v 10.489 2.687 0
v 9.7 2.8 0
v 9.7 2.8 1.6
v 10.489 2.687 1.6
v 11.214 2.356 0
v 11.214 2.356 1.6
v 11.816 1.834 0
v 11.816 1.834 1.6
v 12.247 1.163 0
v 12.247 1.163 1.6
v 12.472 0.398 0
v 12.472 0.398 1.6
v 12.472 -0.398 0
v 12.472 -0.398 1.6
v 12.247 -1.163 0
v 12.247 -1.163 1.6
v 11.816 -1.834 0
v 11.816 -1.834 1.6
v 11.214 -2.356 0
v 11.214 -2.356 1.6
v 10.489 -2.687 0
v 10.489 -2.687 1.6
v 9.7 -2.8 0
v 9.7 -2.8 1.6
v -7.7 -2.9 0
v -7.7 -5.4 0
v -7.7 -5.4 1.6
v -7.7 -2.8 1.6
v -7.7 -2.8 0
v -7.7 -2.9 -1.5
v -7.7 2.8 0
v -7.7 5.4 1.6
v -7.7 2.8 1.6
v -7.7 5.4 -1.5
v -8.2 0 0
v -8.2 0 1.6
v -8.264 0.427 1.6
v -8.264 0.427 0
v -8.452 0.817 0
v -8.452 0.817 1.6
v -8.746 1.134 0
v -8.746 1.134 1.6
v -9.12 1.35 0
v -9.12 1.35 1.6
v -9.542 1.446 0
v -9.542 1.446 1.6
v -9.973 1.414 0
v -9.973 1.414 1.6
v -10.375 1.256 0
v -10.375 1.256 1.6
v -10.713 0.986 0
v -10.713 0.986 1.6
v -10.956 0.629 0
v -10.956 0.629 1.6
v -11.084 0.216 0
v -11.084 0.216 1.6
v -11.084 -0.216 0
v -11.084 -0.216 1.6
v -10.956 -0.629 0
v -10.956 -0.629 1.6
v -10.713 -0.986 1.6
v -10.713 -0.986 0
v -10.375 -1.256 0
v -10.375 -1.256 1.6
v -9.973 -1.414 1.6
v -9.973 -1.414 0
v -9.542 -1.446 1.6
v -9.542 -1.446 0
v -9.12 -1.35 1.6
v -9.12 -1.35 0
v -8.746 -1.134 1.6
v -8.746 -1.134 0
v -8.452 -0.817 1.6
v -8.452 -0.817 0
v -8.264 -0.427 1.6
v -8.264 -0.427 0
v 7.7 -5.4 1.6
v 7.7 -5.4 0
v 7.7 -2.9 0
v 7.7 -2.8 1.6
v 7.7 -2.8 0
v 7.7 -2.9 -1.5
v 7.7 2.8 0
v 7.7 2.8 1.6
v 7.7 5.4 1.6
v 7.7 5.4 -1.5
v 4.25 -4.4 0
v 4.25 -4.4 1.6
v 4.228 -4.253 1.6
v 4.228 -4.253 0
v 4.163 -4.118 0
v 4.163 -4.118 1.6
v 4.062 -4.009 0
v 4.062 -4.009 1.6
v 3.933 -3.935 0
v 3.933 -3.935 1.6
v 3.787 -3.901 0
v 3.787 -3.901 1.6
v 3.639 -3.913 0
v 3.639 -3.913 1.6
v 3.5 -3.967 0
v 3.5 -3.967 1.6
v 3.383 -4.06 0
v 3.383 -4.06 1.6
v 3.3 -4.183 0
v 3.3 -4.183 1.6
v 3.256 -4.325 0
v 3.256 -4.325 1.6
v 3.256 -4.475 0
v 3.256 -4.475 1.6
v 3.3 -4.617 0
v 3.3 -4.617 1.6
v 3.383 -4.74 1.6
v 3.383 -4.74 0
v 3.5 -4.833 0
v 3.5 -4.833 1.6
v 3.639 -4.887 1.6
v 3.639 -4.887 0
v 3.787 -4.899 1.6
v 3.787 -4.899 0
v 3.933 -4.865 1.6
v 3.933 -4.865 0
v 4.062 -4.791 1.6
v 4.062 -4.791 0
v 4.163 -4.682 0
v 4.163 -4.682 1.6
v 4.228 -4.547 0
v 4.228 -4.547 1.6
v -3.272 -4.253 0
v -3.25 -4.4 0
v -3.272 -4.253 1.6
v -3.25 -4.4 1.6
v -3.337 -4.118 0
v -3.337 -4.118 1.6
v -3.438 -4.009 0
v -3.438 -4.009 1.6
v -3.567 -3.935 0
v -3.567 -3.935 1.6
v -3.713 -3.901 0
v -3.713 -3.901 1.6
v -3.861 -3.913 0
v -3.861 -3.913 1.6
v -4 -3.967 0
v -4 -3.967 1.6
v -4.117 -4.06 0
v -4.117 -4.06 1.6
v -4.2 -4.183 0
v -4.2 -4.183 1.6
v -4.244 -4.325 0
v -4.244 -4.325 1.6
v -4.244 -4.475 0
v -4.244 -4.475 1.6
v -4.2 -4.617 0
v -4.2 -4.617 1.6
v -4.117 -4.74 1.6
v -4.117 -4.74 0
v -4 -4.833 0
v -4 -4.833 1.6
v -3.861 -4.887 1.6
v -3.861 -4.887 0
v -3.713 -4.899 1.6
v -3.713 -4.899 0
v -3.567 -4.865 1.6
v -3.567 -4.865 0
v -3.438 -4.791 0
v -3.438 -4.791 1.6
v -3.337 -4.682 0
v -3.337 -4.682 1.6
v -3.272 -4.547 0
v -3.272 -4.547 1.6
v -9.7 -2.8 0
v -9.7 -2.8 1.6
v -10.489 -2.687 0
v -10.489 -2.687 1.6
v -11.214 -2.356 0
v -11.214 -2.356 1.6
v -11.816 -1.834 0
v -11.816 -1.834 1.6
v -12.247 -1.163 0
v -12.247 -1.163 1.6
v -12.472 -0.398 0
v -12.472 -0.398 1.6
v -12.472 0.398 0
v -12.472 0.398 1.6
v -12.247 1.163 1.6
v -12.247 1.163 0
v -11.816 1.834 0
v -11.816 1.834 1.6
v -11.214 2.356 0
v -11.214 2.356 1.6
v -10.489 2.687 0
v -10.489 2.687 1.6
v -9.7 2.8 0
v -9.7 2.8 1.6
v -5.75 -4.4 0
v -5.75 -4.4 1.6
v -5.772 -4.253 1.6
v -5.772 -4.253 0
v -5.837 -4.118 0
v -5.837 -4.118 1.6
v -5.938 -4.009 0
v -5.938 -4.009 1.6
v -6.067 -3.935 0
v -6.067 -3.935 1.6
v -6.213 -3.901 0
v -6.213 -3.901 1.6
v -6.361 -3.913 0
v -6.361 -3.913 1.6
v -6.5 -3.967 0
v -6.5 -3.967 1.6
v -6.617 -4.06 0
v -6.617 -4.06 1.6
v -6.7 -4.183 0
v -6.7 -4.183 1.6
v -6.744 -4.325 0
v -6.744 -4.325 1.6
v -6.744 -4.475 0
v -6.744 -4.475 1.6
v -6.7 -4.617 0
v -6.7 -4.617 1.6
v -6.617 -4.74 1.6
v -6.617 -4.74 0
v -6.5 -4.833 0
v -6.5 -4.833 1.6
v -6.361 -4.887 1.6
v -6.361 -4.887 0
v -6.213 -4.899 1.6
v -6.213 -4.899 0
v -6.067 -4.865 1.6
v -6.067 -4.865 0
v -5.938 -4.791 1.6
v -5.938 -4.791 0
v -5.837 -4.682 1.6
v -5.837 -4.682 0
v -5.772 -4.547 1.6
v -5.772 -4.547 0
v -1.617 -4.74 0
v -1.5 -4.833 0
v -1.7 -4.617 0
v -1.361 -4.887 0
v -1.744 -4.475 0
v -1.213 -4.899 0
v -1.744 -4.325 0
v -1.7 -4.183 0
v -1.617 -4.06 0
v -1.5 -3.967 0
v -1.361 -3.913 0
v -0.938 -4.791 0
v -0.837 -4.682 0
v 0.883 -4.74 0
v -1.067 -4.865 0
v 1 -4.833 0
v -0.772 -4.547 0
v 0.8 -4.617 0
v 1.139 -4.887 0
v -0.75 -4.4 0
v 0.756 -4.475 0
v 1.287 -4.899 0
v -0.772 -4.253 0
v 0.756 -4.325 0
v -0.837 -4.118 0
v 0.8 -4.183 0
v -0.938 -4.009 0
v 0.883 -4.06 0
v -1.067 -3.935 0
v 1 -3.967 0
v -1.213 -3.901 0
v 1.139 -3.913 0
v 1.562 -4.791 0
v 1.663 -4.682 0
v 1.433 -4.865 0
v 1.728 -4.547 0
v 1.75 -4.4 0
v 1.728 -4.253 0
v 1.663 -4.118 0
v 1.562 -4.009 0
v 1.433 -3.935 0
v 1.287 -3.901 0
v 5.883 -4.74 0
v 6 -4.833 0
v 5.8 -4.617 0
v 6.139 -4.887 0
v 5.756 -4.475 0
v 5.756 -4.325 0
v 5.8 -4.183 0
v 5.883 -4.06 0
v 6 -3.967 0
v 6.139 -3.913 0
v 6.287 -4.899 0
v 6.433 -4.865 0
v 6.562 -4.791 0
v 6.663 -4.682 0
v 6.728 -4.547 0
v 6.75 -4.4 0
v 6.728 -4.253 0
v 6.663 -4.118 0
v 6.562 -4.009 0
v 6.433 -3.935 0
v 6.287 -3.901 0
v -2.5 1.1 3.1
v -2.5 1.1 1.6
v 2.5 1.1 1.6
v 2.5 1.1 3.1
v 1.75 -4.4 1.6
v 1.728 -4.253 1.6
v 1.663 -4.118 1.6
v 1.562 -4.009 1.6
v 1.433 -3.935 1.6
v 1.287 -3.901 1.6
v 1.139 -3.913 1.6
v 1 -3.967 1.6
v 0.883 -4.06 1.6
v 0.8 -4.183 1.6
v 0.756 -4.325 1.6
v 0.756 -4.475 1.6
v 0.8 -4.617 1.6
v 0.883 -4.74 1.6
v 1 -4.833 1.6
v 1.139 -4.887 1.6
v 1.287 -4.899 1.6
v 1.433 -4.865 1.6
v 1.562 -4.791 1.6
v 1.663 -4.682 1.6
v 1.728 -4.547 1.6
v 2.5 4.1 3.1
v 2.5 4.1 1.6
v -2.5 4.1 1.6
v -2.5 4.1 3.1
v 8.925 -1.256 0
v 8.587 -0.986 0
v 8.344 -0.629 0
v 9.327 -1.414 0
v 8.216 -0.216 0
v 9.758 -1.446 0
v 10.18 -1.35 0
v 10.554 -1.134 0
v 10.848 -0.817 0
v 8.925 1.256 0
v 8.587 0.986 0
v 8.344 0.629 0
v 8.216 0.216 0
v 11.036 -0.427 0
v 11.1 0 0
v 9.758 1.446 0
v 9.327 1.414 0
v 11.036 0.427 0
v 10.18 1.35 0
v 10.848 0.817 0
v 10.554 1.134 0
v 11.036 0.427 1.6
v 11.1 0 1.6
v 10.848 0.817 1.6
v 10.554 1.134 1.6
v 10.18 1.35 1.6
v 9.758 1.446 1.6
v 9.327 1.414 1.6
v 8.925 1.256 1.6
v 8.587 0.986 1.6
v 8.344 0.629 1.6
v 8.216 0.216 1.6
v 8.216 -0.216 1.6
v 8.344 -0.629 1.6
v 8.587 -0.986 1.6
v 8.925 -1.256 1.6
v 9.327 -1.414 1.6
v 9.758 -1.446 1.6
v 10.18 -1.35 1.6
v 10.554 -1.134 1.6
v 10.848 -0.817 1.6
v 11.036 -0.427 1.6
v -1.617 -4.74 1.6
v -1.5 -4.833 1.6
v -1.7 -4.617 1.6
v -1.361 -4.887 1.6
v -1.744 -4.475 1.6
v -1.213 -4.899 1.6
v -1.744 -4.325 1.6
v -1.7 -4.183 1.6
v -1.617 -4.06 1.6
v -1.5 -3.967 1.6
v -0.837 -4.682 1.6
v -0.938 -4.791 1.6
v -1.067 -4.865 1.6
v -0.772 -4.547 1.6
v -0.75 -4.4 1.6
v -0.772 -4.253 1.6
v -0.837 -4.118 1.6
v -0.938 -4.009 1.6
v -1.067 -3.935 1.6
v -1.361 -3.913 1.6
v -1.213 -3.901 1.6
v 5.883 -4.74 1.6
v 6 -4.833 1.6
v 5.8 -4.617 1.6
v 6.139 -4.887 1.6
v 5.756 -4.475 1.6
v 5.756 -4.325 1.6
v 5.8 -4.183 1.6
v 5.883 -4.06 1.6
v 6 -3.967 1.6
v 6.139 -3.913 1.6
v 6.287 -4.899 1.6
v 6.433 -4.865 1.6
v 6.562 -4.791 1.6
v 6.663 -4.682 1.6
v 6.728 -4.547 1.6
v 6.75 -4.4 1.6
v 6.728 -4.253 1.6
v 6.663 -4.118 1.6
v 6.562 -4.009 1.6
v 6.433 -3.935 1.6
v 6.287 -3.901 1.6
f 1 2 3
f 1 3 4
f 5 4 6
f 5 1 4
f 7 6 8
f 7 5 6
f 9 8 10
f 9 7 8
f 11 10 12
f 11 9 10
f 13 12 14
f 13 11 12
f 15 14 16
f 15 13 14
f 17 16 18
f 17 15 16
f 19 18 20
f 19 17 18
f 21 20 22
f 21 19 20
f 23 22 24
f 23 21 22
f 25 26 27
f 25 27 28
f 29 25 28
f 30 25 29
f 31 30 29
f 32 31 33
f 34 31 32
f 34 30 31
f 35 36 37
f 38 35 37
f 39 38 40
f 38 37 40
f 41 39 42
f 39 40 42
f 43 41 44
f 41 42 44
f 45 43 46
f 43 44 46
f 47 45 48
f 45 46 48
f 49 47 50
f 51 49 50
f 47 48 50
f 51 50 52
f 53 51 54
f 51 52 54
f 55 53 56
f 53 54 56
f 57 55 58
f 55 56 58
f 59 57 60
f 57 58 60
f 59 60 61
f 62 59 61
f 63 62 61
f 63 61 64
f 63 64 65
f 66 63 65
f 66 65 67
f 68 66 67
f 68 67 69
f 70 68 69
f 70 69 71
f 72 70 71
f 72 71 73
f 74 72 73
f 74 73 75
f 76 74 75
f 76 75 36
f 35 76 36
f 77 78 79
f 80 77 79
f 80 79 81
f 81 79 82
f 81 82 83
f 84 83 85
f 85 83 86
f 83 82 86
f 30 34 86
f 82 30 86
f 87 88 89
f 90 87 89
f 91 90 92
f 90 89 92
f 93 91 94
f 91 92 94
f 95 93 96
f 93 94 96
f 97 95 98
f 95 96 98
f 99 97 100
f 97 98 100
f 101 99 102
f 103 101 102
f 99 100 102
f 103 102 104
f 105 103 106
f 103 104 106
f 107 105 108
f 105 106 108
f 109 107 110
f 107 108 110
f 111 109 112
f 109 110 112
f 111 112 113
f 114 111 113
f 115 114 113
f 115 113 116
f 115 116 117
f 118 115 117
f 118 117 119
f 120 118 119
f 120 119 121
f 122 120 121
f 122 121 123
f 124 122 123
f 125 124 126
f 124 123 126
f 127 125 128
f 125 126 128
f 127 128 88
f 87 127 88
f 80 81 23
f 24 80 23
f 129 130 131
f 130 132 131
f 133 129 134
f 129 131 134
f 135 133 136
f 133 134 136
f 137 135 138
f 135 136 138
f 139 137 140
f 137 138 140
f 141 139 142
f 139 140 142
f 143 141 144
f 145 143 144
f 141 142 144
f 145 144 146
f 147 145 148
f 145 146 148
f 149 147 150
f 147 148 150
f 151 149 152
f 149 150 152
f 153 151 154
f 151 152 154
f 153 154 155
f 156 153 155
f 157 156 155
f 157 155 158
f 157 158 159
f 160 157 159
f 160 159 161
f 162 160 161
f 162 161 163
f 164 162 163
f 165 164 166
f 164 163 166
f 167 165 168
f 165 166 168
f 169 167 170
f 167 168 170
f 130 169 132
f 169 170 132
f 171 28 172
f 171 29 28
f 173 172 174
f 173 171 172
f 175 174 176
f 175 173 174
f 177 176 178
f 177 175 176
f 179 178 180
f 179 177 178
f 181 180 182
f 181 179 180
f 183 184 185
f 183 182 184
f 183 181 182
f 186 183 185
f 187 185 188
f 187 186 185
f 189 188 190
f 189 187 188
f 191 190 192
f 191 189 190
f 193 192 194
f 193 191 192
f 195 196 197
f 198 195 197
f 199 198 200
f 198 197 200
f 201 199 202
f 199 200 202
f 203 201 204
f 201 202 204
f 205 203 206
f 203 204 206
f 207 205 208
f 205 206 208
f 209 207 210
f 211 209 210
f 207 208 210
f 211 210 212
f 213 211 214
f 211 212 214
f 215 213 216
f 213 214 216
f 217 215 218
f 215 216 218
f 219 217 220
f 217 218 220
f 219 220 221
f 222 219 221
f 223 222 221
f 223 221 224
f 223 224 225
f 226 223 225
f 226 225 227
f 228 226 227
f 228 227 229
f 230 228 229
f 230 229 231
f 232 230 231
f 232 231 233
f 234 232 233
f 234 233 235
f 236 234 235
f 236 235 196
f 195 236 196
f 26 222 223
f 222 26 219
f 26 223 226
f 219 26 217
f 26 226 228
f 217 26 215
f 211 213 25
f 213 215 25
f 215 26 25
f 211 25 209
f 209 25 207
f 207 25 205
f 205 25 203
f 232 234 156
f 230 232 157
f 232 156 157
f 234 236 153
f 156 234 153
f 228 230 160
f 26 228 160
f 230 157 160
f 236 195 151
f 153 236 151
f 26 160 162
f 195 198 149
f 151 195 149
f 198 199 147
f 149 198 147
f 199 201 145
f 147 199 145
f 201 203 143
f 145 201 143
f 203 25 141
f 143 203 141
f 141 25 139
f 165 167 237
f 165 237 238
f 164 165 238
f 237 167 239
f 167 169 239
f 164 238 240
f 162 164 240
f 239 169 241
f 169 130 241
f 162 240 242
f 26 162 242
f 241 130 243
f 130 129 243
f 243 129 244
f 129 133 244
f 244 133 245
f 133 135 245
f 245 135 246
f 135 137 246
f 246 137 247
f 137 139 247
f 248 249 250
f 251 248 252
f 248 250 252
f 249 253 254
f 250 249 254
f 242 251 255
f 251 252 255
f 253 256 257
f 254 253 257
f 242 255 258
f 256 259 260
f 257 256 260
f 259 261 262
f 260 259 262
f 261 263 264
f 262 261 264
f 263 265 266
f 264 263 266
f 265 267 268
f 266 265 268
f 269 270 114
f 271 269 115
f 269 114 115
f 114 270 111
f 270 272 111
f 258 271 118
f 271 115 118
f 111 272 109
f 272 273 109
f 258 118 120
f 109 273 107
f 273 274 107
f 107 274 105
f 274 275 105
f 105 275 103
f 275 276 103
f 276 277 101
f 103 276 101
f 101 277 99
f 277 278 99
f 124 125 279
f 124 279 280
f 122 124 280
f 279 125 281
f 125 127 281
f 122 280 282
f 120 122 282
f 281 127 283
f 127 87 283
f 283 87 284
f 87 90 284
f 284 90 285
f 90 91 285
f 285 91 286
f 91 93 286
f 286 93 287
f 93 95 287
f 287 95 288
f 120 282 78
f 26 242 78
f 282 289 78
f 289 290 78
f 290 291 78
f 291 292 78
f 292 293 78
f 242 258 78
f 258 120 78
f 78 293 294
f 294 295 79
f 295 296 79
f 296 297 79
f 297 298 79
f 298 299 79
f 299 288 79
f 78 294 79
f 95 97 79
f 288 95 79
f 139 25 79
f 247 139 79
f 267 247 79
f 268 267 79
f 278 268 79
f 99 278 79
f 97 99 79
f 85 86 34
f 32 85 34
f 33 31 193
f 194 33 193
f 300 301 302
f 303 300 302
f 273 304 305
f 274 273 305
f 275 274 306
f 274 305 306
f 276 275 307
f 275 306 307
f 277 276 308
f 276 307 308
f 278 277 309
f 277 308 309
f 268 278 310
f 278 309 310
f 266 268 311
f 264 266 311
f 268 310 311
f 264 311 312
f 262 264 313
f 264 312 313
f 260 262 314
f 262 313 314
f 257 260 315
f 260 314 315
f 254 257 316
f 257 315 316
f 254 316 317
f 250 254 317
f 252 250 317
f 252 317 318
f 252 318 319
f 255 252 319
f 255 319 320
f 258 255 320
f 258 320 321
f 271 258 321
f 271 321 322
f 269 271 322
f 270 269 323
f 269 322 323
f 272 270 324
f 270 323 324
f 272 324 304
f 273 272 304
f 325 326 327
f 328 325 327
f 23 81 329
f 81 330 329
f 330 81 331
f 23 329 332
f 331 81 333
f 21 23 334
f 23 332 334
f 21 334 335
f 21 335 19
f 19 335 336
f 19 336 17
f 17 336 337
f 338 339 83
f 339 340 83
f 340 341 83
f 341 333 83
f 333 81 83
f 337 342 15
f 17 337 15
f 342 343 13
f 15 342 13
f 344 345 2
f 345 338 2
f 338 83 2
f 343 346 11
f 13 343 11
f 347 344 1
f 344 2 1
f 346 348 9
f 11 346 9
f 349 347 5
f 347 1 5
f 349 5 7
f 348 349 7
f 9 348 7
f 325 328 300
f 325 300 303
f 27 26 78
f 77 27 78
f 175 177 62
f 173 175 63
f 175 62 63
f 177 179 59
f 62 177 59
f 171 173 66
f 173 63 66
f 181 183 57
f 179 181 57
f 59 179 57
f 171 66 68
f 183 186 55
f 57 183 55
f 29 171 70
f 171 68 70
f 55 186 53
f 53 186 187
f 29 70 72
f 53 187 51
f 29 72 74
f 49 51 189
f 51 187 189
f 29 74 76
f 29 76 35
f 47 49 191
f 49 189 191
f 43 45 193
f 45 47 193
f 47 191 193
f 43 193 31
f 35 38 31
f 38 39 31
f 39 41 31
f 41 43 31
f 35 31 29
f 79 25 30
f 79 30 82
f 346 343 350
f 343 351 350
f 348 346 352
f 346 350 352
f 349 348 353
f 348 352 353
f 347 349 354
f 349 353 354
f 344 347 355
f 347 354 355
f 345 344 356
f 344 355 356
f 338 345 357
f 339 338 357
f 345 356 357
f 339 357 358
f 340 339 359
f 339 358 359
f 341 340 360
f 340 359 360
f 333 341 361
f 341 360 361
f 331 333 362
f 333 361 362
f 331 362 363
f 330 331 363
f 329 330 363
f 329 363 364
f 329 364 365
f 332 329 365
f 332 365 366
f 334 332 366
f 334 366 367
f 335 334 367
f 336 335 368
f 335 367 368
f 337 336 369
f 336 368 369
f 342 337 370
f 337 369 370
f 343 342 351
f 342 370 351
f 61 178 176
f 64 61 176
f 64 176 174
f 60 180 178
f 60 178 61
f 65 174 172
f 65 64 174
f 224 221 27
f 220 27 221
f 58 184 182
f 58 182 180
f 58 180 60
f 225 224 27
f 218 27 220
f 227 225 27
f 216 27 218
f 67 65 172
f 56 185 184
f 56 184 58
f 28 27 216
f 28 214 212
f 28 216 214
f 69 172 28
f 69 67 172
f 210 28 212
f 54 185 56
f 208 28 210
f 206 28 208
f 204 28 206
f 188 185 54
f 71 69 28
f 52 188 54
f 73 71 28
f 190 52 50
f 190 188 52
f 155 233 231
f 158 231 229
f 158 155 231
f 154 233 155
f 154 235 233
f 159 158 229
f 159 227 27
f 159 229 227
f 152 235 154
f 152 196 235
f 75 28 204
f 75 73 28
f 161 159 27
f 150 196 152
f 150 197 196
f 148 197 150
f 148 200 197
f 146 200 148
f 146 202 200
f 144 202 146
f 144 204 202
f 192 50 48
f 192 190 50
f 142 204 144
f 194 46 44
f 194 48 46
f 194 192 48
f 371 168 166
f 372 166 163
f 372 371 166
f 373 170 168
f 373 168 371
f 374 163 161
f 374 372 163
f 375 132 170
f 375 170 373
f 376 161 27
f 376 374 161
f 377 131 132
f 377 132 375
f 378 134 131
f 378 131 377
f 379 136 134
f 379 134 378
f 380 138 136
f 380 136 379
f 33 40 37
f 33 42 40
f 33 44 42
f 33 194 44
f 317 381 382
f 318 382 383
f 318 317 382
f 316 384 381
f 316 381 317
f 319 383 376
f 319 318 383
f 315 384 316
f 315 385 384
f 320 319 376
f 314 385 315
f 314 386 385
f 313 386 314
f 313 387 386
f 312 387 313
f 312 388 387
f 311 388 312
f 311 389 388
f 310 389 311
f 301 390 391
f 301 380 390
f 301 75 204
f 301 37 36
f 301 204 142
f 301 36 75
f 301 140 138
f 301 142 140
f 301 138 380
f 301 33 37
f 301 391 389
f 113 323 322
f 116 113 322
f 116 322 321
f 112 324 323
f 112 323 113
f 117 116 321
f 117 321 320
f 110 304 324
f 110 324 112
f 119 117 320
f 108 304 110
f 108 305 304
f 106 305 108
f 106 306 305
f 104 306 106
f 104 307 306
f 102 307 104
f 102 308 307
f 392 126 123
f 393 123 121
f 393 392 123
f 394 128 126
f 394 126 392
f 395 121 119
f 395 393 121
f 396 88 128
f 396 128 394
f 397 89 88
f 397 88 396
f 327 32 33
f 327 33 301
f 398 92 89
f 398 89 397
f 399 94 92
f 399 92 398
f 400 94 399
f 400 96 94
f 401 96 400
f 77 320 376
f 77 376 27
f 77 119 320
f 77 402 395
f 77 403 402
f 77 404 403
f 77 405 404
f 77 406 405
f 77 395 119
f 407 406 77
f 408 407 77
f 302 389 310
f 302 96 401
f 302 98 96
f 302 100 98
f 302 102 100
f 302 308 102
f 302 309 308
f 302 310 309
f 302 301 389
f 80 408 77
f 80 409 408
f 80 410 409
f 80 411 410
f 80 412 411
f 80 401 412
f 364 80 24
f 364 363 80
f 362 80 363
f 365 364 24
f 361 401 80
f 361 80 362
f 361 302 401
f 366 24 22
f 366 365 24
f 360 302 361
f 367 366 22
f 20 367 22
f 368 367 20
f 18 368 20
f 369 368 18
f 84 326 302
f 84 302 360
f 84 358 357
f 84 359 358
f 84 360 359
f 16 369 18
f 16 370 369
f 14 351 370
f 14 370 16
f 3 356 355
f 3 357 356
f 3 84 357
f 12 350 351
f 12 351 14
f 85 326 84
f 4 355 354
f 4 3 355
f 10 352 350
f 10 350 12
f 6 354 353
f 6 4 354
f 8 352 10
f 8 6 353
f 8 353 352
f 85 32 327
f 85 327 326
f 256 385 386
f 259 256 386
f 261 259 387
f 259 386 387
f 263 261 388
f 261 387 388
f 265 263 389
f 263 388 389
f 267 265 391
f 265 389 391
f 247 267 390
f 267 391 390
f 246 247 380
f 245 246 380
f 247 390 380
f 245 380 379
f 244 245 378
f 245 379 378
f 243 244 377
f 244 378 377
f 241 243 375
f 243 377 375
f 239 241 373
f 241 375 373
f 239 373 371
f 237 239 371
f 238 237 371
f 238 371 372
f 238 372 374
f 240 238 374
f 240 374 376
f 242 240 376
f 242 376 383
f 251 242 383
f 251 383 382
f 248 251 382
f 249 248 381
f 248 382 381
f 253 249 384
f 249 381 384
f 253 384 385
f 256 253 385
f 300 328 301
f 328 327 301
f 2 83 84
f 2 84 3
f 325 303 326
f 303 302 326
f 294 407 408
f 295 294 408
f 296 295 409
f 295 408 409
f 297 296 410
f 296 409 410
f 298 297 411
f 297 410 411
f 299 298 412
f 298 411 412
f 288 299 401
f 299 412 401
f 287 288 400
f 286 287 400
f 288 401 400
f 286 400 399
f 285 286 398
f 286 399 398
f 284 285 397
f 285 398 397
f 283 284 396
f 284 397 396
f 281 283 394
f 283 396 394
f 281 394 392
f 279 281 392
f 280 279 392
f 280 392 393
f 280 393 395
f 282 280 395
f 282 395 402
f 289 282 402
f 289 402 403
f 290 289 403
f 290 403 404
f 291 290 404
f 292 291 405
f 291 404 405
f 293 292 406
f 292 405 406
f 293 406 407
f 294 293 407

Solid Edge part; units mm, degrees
sketch "Sketch1" plane through (0, 0, 0) normal (0, 0, 1) x (1, 0, 0)
  line L0 (-7.7, -5.4) -> (7.7, -5.4)
  line L1 (7.7, -5.4) -> (7.7, -2.8)
  line L2 (7.7, -2.8) -> (9.7, -2.8)
  arc A0 (9.7, 2.8) -> (9.7, -2.8) centre (9.7, 0) cw
  line L3 (7.7, 2.8) -> (9.7, 2.8)
  line L4 (7.7, 5.4) -> (7.7, 2.8)
  line L5 (7.7, 5.4) -> (-7.7, 5.4)
  line L6 (-7.7, 5.4) -> (-7.7, 2.8)
  line L7 (-7.7, 2.8) -> (-9.7, 2.8)
  arc A1 (-9.7, 2.8) -> (-9.7, -2.8) centre (-9.7, 0) ccw
  line L8 (-7.7, -2.8) -> (-9.7, -2.8)
  line L9 (-7.7, -5.4) -> (-7.7, -2.8)
  dimension "D1" = 5.6
  dimension "D2" = 25
  dimension "D3" = 15.4
  dimension "D4" = 10.8
extrude "Protrusion1" add sketch "Sketch1" along normal blind 1.6
sketch "Sketch2" plane through (0, 0, 1.6) normal (0, 0, 1) x (1, 0, 0)
  circle A0 centre (9.65, 0) radius 1.45
  circle A1 centre (-9.65, 0) radius 1.45
  dimension "D1" = 1.4
  dimension "D2" = 2.9
  dimension "D3" = 2.9
  dimension "D4" = 1.4
extrude "Cutout1" cut sketch "Sketch2" against normal through all
sketch "Sketch3" plane through (0, 0, 1.6) normal (0, 0, 1) x (1, 0, 0)
  circle A0 centre (-6.25, -4.4) radius 0.5
  circle A1 centre (-3.75, -4.4) radius 0.5
  circle A2 centre (-1.25, -4.4) radius 0.5
  circle A3 centre (1.25, -4.4) radius 0.5
  circle A4 centre (3.75, -4.4) radius 0.5
  circle A5 centre (6.25, -4.4) radius 0.5
  dimension "D1" = 1
  dimension "D2" = 0.5
  dimension "D3" = 2.5
extrude "Cutout2" cut sketch "Sketch3" against normal through all
sketch "Sketch4" plane through (0, 0, 1.6) normal (0, 0, 1) x (1, 0, 0)
  line L0 (-2.5, 1.1) -> (2.5, 1.1)
  line L1 (2.5, 1.1) -> (2.5, 4.1)
  line L2 (2.5, 4.1) -> (-2.5, 4.1)
  line L3 (-2.5, 4.1) -> (-2.5, 1.1)
  dimension "D1" = 5
  dimension "D2" = 3
  dimension "D3" = 4.3
extrude "Extrusionsausprägung_2" add sketch "Sketch4" along normal blind 1.5
sketch "Sketch5" plane through (0, 0, 0) normal (0, 0, -1) x (-1, 0, 0)
  line L0 (-7.7, 5.4) -> (7.7, 5.4)
  line L1 (7.7, 5.4) -> (7.7, -2.9)
  line L2 (7.7, -2.9) -> (-7.7, -2.9)
  line L3 (-7.7, -2.9) -> (-7.7, 5.4)
  dimension "D1" = 2.5
extrude "Extrusionsausprägung_3" add sketch "Sketch5" along normal blind 1.5
